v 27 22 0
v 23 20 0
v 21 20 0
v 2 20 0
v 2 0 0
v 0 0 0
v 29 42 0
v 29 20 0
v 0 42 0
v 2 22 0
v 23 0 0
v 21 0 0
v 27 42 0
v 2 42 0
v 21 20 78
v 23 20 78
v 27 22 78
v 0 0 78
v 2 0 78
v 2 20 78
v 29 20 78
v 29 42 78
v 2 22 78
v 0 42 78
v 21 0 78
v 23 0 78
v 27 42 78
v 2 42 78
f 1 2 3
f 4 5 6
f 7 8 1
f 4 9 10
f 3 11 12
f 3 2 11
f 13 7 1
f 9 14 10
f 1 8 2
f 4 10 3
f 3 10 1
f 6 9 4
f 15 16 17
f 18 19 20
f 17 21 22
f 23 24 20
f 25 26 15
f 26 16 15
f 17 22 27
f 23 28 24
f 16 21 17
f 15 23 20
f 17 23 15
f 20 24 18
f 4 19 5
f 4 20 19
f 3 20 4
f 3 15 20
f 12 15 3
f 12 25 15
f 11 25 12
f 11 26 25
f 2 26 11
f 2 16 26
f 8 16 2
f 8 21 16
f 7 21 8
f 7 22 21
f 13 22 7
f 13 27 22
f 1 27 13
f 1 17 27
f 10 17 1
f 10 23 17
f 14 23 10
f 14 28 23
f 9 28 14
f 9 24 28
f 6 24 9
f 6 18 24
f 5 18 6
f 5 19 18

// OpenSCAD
module holder()
{
  wall = 2;
  h = 74 + 2*wall;

  module side_2d()
  {
    // base
    square([wall, 20]);
    translate([wall + 19, 0])
      square([wall, 20]);
    // upper part
    translate([0, 20])
    {
      // bottom / ceiling
      square([25 + 2*wall, wall]);
      // top
      translate([0, wall])
      {
        square([wall, 20]);
        #translate([wall+25, 0])
          square([wall, 20]);
      }
    }
  }

  linear_extrude(h)
    side_2d();
}


holder();
